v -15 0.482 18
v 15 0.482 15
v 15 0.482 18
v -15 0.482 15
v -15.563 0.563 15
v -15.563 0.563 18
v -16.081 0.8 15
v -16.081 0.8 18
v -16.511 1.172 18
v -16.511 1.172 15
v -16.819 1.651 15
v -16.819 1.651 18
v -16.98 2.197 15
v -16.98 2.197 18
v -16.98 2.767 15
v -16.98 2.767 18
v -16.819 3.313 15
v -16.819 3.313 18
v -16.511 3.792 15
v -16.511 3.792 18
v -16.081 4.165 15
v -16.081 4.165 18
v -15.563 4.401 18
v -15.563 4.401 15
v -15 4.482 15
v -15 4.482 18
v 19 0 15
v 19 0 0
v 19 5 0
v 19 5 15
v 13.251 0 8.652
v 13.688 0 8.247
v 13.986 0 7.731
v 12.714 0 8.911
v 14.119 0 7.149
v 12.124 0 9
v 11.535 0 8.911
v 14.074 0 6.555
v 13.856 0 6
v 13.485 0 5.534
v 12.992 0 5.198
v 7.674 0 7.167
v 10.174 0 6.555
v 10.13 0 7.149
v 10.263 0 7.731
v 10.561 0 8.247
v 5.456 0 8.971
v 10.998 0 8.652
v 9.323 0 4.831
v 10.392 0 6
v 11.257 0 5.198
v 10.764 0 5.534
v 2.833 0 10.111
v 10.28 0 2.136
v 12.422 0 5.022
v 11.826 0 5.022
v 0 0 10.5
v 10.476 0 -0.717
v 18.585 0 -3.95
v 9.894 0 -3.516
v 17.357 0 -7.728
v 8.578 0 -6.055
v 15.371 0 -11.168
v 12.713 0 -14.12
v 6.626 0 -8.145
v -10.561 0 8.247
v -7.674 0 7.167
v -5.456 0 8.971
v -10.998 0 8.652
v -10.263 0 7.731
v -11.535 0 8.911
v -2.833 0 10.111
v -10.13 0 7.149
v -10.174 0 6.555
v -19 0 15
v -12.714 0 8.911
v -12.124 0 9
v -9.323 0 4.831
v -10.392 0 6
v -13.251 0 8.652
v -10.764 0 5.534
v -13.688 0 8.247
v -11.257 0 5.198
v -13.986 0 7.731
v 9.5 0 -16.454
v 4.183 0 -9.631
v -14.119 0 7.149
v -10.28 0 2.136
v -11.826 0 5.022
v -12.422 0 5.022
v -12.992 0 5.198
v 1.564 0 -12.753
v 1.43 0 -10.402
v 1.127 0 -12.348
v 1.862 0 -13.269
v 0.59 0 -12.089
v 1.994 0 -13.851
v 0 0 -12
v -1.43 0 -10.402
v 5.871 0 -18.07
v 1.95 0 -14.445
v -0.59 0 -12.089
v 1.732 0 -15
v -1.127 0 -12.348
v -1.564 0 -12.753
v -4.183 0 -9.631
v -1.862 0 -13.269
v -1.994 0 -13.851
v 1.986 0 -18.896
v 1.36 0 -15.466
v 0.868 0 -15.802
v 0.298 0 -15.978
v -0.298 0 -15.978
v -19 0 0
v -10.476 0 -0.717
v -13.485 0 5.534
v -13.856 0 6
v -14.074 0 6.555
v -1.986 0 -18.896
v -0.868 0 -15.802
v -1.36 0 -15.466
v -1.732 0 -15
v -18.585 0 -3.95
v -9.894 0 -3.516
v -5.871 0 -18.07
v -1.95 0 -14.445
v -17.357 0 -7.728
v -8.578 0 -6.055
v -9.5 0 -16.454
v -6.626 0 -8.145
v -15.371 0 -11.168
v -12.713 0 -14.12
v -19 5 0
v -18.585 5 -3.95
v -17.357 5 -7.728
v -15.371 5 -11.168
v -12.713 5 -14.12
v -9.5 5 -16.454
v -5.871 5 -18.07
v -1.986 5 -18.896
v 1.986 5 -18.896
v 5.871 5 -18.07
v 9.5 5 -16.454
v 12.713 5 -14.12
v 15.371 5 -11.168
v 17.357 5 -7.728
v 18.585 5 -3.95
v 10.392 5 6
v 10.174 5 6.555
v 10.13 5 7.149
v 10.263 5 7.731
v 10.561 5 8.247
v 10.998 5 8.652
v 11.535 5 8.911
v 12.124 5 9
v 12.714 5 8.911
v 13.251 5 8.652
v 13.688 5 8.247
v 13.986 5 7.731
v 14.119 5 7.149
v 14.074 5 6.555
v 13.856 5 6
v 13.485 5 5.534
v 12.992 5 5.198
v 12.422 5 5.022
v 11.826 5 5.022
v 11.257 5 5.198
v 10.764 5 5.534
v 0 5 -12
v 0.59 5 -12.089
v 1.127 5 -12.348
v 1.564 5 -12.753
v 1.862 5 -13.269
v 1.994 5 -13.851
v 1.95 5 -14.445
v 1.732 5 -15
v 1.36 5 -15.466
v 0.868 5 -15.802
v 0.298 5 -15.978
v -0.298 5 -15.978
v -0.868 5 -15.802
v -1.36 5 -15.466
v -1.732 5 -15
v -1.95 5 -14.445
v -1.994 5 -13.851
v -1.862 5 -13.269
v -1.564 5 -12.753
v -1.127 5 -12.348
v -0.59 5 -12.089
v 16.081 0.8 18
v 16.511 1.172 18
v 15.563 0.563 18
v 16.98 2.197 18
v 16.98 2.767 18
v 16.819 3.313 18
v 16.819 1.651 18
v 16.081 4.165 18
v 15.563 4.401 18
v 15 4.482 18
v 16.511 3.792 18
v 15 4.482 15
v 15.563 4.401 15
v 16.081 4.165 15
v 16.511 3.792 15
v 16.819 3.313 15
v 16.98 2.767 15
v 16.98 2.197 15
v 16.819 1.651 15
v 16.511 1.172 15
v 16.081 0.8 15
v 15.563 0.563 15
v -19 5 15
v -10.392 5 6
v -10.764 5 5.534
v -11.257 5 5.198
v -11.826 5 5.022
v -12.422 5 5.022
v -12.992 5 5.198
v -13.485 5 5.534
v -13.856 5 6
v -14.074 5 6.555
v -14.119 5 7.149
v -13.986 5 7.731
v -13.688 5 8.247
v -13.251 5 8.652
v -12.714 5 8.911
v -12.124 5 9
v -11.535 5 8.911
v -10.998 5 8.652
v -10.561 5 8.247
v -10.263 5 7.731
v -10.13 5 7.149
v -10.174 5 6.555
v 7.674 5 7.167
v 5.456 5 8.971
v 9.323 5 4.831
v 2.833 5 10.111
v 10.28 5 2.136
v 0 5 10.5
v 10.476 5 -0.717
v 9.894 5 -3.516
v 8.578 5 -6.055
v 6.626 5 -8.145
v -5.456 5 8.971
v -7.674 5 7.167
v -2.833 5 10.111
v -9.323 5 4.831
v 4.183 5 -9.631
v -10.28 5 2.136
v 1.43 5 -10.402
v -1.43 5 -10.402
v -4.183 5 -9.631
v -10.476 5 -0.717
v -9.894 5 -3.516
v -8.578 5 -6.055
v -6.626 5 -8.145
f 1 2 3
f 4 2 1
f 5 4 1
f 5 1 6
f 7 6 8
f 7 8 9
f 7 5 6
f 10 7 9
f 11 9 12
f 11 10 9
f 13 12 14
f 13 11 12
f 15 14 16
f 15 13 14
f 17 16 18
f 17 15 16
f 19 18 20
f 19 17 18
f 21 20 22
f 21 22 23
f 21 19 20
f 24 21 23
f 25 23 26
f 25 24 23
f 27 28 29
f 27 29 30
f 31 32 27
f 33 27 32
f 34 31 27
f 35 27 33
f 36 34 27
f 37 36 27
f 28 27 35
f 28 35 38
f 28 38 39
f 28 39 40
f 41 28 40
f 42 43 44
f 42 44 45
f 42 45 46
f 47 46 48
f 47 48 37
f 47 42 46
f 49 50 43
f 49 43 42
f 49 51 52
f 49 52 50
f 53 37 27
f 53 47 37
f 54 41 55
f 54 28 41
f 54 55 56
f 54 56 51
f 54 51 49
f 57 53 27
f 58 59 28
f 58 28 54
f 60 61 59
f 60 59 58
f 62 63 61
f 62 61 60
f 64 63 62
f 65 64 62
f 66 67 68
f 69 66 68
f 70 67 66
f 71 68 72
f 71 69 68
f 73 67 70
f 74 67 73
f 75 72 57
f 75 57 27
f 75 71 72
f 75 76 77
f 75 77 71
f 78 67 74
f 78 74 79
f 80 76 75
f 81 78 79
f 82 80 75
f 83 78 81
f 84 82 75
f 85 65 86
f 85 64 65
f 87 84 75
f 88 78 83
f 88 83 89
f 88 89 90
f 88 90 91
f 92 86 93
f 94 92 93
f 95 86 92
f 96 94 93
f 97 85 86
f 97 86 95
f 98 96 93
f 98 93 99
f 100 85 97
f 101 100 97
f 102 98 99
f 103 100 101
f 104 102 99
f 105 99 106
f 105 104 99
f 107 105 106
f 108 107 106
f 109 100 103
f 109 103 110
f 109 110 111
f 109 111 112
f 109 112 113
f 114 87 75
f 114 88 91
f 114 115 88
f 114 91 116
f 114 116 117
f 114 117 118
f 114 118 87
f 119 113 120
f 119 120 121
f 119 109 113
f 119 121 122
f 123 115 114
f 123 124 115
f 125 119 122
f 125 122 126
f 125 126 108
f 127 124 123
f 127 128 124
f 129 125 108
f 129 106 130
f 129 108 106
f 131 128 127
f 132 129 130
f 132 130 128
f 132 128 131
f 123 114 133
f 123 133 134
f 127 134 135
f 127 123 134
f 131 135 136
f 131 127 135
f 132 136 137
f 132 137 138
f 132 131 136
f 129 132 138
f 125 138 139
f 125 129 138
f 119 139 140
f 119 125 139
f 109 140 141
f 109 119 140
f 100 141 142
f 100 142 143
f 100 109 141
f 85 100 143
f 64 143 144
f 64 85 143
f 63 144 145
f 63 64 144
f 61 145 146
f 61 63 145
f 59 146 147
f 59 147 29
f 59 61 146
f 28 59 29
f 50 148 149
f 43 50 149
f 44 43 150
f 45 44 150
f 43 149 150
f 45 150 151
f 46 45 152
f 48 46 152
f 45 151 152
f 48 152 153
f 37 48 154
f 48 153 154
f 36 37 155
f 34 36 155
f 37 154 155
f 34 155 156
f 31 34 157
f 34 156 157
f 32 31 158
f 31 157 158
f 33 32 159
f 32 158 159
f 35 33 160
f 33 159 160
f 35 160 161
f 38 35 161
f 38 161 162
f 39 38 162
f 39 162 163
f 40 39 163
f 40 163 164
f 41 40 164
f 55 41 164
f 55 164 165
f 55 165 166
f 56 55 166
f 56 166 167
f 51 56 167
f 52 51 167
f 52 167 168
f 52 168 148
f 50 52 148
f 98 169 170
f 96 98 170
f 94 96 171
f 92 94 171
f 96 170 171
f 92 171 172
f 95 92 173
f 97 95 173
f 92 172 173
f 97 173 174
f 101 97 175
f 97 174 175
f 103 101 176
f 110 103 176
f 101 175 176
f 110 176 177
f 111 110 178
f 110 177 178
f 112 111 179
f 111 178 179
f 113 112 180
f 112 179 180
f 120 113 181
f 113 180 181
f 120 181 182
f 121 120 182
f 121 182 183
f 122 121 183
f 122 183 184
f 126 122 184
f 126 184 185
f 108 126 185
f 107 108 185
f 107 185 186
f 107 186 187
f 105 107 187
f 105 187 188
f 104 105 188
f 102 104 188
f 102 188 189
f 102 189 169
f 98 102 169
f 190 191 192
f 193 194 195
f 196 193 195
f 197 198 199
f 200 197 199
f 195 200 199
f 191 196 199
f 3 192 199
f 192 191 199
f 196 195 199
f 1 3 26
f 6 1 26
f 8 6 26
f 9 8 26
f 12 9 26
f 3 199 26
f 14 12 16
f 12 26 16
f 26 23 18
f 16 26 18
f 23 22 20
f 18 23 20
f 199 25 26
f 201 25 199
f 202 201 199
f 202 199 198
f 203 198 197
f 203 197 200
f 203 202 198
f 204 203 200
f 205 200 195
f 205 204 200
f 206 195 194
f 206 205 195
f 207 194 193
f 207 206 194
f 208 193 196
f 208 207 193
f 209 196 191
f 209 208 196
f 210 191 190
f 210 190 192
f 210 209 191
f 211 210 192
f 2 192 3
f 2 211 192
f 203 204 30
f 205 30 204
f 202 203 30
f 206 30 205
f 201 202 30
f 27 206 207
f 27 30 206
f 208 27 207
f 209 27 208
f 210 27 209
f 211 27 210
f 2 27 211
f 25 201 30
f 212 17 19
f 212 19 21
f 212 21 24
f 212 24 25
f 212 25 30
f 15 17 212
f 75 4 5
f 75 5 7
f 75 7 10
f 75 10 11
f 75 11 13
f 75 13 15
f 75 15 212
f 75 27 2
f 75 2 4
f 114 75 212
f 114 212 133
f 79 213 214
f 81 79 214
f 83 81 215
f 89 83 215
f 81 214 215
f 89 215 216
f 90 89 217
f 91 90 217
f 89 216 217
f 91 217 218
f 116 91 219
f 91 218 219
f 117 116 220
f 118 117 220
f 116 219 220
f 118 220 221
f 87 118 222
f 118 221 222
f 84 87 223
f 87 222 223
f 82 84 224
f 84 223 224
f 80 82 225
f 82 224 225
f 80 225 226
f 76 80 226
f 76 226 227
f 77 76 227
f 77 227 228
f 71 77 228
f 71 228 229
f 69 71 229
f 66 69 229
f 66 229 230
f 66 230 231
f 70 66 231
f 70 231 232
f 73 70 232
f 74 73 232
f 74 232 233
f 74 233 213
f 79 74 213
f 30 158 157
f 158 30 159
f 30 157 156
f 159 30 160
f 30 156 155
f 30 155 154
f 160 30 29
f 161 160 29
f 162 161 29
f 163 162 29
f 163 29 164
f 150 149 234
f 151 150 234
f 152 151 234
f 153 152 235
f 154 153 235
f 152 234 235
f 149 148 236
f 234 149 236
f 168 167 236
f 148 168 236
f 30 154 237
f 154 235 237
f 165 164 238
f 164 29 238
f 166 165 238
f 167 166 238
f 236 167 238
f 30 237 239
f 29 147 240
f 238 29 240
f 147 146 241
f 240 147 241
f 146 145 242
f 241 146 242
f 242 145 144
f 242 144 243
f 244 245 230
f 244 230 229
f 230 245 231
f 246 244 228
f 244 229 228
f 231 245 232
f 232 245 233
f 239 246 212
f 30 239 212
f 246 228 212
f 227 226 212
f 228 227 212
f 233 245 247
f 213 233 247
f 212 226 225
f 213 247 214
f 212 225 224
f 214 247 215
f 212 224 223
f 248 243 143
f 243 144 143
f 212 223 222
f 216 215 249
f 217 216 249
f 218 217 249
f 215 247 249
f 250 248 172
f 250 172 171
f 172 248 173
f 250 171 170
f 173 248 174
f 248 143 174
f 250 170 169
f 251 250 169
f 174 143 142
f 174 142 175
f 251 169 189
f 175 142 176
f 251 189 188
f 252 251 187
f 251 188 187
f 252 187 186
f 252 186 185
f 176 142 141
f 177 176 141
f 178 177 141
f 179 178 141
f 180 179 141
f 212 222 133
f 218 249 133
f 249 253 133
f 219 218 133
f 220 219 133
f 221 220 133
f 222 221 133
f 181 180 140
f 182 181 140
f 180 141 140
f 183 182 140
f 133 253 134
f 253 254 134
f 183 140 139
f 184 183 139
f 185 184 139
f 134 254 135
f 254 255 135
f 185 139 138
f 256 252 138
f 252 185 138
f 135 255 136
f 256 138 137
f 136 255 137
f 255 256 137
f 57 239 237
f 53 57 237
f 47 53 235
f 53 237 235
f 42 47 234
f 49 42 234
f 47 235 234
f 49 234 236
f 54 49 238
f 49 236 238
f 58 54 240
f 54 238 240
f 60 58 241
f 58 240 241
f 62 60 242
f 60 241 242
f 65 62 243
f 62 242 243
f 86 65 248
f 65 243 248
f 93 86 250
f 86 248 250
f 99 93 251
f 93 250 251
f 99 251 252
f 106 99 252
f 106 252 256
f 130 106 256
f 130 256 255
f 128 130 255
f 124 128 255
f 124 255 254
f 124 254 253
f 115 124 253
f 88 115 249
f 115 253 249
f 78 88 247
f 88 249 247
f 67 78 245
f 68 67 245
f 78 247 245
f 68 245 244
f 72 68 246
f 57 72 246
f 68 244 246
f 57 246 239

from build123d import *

# Parameters (mm, degrees)
BOSS_EXTRUDE1_DEPTH = 5
BOSS_EXTRUDE2_DEPTH = 3
SKETCH3_R           = 10.5
CUT_EXTRUDE1_DEPTH  = 5
SKETCH4_R           = 2
CUT_EXTRUDE2_DEPTH  = 10
CIRPATTERN1_COUNT   = 3


with BuildPart() as part:
    # Sketch1 → Boss-Extrude1 (new body)
    with BuildSketch(Plane(origin=(0, 0, 0), x_dir=(1, 0, 0), z_dir=(0, 1, 0))):
        with BuildLine():
            Line((19, 0), (19, -15))
            Line((19, -15), (-19, -15))
            Line((-19, -15), (-19, 0))
            ThreePointArc((-19, 0), (0, 19), (19, 0))
        make_face()
    extrude(amount=BOSS_EXTRUDE1_DEPTH)

    # Sketch2 → Boss-Extrude2 (add)
    with BuildSketch(Plane.XY.offset(15)):
        with BuildLine():
            Line((-15, 4.482032097), (15, 4.482032097))
            ThreePointArc((15, 4.482032097), (17, 2.482032097), (15, 0.482032097))
            Line((15, 0.482032097), (-15, 0.482032097))
            ThreePointArc((-15, 0.482032097), (-17, 2.482032097), (-15, 4.482032097))
        make_face()
    extrude(amount=BOSS_EXTRUDE2_DEPTH)

    # Sketch3 → Cut-Extrude1 (cut)
    with BuildSketch(Plane(origin=(0, 5, 0), x_dir=(1, 0, 0), z_dir=(0, 1, 0))):
        with Locations(Location((0, 0, 0), (0, 0, 270))):
            Circle(SKETCH3_R)
    extrude(amount=-CUT_EXTRUDE1_DEPTH, mode=Mode.SUBTRACT)

    # Sketch4 → Cut-Extrude2 (cut)
    with BuildSketch(Plane(origin=(0, 5, 0), x_dir=(1, 0, 0), z_dir=(0, 1, 0))):
        with Locations(Location((0, 14, 0), (0, 0, 270))):
            Circle(SKETCH4_R)
    cut_extrude2 = extrude(amount=-CUT_EXTRUDE2_DEPTH, mode=Mode.SUBTRACT)

    # CirPattern1: Cut-Extrude2 ×3 about axis
    cirpattern1_axis = Axis((0, 0, 0), (0, 1, 0))
    for i in range(1, CIRPATTERN1_COUNT):
        add(cut_extrude2.rotate(cirpattern1_axis, i * 360 / CIRPATTERN1_COUNT), mode=Mode.SUBTRACT)


solid = part.part
